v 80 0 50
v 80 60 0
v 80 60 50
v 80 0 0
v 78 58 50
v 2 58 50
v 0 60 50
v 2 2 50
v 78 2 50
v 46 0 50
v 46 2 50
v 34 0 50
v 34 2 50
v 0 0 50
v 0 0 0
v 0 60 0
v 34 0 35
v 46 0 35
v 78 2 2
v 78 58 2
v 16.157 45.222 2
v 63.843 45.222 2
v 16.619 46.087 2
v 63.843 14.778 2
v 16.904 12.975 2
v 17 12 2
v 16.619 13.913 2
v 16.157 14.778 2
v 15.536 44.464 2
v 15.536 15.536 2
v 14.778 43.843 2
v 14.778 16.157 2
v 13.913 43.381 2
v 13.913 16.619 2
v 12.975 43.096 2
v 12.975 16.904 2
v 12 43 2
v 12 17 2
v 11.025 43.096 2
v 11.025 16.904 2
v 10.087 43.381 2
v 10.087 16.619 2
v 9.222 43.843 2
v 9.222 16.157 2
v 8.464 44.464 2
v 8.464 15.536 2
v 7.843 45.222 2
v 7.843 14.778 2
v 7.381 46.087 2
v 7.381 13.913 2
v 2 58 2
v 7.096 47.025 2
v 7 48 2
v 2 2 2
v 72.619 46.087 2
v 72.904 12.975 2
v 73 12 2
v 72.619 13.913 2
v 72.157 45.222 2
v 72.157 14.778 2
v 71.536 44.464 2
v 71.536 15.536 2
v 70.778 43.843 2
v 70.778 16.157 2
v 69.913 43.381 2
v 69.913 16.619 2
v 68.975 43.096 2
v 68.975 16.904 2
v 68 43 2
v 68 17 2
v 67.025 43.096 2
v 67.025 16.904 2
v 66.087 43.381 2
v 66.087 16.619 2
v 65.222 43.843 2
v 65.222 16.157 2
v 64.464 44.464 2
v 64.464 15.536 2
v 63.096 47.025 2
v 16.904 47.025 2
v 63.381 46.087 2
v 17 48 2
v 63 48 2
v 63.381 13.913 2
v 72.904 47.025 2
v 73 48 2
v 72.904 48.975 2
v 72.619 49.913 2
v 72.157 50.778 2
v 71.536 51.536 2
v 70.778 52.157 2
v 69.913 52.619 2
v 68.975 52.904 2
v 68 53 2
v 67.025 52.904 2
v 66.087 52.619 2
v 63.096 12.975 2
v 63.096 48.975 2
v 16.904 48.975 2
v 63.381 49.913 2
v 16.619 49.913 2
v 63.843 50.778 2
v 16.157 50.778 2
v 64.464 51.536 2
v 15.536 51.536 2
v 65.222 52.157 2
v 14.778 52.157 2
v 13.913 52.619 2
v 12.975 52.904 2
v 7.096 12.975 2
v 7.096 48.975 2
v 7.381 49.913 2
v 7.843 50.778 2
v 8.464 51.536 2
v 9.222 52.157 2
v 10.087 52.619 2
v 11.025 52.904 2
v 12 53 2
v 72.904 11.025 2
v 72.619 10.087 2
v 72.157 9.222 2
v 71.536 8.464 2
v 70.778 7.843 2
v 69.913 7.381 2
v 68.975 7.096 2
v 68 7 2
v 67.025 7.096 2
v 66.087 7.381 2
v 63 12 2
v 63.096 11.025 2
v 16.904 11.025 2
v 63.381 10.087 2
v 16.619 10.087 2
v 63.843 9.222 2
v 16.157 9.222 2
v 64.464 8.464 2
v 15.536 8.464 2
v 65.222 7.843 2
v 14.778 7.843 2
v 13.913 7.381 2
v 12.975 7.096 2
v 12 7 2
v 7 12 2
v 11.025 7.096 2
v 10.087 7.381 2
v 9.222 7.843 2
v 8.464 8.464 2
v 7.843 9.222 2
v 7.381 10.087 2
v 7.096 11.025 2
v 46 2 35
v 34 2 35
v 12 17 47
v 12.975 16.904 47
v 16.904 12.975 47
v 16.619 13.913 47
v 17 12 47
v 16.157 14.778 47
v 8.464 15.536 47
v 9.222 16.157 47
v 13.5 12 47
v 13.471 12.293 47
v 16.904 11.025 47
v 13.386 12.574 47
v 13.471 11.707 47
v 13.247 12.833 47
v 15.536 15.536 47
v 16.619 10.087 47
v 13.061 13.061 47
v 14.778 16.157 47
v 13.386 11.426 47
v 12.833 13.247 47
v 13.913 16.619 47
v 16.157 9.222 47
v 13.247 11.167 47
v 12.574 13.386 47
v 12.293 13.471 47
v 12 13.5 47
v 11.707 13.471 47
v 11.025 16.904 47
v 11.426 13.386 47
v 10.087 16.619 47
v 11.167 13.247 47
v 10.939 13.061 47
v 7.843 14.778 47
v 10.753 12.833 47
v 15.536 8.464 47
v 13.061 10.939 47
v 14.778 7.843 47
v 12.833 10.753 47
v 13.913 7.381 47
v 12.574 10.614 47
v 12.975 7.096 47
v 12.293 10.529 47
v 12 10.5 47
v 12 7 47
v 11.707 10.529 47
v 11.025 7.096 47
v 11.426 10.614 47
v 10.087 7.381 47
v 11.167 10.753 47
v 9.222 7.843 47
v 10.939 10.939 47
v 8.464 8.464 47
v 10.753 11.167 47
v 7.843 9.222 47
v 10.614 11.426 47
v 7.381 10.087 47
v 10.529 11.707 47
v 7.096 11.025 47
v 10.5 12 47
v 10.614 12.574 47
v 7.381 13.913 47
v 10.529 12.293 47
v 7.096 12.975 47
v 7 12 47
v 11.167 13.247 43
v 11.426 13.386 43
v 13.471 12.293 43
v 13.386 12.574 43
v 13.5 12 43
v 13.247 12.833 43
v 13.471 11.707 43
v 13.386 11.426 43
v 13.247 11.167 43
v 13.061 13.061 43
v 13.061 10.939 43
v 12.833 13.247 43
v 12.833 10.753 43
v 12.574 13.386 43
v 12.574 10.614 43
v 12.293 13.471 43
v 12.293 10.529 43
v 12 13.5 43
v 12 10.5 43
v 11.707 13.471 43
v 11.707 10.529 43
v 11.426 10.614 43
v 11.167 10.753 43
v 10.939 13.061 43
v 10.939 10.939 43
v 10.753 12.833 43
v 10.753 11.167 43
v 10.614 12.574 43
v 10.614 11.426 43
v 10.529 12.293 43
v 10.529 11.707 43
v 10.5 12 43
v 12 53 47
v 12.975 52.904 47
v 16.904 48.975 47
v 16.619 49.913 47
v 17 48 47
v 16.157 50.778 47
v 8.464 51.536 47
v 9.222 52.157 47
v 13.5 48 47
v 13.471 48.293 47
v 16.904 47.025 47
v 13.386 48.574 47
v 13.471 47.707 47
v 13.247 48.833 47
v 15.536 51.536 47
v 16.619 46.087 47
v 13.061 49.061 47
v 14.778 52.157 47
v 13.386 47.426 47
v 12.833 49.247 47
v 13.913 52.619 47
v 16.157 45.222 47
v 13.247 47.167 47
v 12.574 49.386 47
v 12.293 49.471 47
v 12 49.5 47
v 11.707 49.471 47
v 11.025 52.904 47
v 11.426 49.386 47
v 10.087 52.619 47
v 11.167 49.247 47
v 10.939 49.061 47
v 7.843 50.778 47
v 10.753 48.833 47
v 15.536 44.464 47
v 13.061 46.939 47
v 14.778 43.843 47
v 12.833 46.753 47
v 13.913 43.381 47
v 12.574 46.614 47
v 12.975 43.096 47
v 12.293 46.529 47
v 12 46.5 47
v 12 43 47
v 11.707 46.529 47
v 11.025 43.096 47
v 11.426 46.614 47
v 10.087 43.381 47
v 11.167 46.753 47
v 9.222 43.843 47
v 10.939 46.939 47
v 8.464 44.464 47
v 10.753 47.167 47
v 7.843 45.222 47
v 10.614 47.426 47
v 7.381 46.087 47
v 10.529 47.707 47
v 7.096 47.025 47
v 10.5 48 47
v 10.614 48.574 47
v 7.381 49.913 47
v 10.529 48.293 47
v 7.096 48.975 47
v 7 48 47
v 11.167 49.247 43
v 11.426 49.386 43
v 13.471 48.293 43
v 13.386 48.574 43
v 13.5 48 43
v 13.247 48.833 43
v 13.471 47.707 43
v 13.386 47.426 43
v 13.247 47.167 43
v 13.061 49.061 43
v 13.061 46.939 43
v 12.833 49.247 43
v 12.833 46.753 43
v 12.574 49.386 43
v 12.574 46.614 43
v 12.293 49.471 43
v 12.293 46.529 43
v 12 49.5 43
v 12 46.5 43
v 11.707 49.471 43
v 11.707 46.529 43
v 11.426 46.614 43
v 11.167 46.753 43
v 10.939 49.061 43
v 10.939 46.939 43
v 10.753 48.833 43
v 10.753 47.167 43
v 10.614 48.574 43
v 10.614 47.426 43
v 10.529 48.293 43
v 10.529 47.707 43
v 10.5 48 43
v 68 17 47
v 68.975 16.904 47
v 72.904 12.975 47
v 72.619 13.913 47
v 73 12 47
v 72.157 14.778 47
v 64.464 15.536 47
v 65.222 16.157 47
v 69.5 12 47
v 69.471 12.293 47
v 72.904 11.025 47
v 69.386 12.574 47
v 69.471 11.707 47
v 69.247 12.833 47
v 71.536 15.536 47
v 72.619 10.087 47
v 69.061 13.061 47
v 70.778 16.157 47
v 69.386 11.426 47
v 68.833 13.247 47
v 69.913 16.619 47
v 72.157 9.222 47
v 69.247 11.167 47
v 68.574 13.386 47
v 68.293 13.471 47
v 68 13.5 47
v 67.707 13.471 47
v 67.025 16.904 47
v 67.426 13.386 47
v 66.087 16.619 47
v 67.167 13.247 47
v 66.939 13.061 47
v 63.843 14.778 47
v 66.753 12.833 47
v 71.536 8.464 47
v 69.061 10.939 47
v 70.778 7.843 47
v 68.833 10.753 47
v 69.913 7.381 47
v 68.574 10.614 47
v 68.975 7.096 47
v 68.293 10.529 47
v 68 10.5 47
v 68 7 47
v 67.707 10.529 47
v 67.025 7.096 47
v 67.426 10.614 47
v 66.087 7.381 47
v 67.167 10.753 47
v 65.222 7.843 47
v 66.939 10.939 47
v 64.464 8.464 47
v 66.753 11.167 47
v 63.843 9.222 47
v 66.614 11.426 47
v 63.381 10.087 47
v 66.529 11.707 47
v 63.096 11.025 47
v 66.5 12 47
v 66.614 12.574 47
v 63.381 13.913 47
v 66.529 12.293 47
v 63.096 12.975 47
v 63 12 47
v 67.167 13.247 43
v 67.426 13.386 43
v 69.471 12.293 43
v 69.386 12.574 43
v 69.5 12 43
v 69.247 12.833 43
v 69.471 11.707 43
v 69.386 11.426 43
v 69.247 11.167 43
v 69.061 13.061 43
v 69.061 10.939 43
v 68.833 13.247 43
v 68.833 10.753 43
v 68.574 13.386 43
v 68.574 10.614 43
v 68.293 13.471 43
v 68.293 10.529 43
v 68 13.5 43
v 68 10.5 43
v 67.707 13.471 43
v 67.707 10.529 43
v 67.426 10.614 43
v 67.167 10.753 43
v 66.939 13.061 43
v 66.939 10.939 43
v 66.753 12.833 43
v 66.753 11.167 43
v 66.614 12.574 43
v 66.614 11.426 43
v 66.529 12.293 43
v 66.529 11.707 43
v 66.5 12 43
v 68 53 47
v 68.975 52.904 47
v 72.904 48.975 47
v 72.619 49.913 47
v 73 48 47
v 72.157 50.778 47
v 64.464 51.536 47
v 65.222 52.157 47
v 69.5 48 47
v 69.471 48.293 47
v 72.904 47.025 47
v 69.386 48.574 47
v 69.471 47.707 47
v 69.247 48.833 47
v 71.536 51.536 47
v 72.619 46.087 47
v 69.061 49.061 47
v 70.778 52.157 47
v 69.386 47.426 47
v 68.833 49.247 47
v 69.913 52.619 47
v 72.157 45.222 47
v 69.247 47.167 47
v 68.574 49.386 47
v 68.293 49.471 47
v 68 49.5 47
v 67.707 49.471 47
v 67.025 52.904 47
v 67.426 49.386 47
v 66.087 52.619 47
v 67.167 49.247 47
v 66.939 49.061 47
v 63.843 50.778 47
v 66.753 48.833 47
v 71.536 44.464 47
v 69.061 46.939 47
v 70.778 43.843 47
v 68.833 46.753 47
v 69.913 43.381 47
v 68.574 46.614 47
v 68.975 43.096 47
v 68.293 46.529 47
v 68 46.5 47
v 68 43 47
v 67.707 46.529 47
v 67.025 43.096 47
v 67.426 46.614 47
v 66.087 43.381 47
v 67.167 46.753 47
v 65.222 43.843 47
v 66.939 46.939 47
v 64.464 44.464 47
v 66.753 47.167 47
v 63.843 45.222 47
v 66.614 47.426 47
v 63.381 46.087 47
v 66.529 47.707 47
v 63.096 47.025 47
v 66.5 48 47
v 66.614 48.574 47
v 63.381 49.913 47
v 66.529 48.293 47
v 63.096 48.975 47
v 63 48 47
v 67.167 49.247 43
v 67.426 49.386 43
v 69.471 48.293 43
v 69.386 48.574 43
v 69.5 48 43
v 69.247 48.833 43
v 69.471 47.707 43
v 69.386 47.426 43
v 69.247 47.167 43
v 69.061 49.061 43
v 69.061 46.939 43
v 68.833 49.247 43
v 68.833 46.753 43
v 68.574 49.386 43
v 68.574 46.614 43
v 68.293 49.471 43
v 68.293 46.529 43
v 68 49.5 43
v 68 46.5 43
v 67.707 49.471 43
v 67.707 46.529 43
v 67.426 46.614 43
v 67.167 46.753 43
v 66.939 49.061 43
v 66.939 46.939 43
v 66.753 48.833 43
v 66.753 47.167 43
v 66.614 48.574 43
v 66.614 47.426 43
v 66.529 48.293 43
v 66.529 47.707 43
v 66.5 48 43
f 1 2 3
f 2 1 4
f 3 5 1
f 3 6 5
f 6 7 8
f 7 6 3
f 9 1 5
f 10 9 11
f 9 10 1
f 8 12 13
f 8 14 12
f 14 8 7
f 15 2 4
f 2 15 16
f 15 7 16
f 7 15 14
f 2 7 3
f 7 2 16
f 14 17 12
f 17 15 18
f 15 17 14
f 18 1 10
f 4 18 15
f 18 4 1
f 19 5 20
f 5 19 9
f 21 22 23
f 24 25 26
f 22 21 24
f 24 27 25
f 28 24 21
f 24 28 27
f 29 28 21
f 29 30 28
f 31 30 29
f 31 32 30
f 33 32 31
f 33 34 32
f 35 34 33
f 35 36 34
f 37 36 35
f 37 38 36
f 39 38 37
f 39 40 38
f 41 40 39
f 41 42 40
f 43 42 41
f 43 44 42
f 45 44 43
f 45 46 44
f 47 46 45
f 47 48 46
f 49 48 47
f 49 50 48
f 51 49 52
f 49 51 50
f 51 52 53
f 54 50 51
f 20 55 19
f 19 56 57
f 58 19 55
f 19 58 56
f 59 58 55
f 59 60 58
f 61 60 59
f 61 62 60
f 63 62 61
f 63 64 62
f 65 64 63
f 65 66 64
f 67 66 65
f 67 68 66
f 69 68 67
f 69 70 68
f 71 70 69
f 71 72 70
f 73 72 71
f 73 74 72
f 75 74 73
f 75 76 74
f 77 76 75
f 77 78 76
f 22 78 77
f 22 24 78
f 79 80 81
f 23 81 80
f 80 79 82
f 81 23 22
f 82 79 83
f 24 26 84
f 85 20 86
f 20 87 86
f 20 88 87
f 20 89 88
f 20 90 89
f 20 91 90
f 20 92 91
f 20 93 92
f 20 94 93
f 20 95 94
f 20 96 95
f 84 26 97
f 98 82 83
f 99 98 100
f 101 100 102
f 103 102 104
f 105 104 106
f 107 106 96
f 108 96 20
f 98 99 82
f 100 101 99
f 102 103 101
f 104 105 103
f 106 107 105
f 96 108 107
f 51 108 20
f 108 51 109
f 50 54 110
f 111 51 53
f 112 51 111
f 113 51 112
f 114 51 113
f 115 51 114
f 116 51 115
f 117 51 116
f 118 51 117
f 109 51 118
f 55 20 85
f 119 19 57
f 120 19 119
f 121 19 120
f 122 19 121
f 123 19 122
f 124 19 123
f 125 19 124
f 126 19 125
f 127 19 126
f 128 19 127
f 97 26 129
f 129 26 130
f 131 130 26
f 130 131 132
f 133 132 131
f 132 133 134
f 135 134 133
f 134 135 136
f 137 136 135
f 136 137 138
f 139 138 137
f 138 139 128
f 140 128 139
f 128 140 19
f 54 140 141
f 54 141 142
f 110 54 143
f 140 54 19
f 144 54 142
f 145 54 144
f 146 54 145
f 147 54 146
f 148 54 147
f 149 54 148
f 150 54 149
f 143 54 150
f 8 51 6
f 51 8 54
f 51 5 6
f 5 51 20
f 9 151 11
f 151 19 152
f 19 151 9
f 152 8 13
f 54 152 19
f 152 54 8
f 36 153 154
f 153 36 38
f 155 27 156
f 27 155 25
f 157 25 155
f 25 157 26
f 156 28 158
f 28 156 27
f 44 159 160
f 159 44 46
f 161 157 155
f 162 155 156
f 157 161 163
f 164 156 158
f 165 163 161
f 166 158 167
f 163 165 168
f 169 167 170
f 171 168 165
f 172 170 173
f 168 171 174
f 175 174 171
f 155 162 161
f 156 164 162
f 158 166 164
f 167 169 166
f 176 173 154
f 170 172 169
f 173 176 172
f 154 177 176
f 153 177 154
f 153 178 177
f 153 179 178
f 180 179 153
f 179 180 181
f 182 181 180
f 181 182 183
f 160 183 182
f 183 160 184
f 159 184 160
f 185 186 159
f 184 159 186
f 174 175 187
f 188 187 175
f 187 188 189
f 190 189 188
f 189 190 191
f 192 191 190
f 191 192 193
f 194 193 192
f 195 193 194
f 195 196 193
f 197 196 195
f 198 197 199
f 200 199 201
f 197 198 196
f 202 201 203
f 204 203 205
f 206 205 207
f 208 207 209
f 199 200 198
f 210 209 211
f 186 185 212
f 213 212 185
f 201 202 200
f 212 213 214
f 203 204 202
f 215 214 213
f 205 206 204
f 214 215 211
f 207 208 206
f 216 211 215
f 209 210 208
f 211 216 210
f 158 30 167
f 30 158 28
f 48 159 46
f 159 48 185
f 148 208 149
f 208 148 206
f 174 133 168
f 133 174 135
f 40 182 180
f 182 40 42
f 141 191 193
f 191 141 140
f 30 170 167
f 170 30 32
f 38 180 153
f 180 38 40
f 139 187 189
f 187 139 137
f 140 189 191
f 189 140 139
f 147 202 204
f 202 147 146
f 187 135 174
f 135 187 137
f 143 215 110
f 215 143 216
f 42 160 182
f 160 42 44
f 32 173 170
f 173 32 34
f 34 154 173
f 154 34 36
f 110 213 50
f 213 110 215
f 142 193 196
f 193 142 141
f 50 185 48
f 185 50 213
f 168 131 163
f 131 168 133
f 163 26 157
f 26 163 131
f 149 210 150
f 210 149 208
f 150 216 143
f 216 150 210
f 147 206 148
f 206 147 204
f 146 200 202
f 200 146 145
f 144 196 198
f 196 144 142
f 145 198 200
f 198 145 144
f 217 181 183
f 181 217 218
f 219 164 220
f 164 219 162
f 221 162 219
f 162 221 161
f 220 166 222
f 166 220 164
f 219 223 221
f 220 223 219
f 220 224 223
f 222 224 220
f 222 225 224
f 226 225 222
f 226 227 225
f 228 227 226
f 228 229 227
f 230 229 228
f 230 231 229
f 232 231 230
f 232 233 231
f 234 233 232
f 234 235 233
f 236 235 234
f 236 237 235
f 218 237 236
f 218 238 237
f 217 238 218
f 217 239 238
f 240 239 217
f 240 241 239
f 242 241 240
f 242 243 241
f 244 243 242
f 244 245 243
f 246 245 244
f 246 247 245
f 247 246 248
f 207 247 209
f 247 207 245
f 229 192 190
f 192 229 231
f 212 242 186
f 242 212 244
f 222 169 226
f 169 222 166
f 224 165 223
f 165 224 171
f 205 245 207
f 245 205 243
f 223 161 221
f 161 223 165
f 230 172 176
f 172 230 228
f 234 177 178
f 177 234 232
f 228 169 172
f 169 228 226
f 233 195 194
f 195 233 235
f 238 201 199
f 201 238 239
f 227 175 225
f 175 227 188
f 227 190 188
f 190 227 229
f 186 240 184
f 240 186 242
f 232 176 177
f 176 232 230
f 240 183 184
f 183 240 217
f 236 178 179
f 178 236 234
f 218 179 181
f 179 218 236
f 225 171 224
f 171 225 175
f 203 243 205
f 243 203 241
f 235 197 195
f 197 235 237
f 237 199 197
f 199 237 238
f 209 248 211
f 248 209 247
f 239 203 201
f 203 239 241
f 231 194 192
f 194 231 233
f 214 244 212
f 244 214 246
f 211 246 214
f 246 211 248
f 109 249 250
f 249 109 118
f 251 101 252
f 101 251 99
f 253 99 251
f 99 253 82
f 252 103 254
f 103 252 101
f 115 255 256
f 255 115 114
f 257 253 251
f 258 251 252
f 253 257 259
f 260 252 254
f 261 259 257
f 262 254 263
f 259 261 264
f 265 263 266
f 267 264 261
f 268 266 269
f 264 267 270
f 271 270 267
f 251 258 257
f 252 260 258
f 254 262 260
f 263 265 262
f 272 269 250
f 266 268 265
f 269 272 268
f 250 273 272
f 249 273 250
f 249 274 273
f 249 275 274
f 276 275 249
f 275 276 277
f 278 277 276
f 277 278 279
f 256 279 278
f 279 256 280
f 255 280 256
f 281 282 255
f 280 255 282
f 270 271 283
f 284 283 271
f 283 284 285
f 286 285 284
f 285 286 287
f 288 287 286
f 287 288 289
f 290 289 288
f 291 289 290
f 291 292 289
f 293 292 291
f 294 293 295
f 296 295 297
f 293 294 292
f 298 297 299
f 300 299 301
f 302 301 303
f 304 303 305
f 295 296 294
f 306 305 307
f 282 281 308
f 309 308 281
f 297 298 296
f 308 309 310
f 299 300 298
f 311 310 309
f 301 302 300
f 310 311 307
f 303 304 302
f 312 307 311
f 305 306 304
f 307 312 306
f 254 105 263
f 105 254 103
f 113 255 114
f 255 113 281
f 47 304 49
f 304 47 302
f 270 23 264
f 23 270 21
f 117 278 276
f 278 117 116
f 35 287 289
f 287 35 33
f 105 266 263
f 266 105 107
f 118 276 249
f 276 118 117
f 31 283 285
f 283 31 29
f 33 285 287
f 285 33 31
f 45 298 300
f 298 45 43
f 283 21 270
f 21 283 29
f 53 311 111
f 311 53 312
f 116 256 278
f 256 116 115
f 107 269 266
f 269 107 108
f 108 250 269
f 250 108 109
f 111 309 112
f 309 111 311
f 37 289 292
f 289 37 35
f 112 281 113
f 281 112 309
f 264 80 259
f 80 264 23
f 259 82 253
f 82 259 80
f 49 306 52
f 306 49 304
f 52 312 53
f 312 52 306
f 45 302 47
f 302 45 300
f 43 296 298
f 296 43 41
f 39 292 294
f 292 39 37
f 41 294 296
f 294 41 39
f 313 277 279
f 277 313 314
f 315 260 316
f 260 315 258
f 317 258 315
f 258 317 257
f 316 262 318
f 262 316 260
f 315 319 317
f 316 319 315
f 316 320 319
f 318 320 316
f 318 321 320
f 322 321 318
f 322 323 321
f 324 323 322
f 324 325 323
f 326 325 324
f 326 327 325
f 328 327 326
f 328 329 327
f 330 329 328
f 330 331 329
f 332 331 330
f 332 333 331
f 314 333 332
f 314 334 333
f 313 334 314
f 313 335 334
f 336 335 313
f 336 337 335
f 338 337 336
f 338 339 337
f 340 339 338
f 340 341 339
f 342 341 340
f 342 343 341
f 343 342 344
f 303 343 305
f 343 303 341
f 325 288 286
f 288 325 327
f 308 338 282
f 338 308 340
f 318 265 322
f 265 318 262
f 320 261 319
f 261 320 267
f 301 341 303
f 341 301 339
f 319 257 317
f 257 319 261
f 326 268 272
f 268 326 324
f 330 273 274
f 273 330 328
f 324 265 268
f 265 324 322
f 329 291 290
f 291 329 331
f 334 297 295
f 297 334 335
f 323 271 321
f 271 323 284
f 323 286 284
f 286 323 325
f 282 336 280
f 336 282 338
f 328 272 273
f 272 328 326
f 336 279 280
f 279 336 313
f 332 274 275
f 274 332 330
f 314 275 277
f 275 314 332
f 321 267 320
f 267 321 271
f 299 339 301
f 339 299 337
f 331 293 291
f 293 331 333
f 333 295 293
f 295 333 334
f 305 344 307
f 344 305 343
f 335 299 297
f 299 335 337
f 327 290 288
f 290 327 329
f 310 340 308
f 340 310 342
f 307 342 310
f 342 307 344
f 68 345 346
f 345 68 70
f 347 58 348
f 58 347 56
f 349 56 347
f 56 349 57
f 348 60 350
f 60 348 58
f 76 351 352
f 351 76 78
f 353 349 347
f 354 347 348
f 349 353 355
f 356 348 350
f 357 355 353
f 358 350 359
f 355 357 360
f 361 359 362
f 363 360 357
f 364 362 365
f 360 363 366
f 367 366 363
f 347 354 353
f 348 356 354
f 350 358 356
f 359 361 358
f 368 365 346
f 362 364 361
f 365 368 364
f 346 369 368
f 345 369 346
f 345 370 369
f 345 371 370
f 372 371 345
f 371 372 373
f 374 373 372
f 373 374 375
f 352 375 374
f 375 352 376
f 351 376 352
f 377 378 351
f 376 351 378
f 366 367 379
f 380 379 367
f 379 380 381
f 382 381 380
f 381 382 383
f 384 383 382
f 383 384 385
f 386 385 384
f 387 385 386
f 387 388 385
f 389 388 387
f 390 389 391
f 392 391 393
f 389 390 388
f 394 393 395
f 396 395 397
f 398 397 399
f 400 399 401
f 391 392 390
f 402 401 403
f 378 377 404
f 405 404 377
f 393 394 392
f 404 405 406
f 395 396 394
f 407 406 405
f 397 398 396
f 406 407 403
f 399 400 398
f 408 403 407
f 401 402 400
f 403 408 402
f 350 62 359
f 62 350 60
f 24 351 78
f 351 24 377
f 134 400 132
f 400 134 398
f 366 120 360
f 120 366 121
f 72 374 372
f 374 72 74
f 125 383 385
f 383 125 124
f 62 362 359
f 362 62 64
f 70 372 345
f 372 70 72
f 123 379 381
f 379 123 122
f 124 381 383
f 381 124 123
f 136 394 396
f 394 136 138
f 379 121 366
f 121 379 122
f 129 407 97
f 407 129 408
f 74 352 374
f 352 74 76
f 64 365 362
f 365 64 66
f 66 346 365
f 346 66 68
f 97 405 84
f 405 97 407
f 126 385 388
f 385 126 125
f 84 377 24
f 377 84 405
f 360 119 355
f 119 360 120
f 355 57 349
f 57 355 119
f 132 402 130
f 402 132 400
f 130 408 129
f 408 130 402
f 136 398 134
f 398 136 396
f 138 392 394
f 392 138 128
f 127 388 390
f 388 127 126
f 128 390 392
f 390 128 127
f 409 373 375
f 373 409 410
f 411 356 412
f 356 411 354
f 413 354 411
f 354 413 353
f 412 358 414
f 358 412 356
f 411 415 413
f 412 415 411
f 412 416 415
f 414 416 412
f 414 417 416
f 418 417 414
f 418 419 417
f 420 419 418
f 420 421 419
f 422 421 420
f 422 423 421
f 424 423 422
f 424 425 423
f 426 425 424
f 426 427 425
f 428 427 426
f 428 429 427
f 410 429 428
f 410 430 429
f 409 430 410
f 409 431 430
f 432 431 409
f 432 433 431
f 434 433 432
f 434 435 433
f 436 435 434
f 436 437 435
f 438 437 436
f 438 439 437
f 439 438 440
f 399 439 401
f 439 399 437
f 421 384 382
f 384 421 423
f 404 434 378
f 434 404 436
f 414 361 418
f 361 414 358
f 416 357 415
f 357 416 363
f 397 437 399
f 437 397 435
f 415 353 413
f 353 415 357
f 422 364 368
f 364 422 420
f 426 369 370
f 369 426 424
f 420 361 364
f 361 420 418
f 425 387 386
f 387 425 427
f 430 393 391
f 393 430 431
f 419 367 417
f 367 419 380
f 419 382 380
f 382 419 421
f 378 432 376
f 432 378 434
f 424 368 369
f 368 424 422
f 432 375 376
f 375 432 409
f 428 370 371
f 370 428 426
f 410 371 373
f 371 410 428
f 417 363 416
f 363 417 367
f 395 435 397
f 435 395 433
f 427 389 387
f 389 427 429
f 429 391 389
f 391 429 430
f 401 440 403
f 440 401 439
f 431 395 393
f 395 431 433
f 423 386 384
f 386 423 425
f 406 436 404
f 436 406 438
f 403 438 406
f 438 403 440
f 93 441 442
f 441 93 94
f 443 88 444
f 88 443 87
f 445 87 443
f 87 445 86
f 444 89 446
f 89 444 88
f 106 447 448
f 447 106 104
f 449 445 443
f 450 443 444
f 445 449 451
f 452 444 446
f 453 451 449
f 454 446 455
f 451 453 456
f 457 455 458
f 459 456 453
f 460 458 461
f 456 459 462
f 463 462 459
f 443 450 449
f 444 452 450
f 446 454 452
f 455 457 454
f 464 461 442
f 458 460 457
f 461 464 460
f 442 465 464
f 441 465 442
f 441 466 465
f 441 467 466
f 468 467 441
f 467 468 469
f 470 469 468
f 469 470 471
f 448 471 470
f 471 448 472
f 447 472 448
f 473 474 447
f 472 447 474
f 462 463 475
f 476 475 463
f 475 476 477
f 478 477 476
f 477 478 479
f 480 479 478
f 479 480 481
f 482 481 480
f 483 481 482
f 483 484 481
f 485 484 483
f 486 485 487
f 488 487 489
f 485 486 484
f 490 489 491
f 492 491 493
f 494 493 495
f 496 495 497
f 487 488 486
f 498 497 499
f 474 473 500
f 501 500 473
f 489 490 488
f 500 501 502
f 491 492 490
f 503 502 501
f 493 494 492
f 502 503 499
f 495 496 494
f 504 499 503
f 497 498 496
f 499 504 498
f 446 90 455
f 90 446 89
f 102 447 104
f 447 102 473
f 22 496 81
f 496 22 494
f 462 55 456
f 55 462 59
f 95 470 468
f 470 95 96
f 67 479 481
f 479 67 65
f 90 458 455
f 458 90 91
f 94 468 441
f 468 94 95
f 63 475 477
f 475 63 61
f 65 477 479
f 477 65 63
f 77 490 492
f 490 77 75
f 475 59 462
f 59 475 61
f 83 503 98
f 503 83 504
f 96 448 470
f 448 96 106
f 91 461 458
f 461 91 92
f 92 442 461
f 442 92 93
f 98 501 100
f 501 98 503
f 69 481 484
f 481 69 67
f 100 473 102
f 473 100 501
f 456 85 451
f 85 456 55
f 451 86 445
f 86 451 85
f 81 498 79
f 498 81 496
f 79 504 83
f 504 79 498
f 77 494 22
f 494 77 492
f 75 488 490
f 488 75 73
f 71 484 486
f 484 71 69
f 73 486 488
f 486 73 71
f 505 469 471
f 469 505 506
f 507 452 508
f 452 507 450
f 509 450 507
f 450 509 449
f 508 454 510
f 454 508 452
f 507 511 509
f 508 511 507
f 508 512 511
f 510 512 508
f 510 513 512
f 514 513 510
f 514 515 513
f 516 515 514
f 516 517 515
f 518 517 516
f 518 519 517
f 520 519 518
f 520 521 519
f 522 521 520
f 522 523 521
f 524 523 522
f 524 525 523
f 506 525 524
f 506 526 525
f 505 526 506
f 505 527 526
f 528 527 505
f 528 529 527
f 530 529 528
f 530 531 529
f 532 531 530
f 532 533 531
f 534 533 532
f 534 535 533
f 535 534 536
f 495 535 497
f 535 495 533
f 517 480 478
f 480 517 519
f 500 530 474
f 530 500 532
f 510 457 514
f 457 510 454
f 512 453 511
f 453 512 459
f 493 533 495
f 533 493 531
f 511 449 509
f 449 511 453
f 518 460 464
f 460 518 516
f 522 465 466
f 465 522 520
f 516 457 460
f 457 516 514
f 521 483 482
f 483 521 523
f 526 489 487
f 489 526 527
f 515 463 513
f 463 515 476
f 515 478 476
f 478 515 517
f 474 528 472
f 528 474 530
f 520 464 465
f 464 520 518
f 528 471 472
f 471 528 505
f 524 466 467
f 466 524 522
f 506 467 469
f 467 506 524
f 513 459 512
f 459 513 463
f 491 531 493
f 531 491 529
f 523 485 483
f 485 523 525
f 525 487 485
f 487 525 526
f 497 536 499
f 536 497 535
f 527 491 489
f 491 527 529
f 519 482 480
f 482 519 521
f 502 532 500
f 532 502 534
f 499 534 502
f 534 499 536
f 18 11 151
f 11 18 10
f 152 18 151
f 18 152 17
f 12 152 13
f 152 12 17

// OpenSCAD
$fn = 32;

// ----------------------------------------------------------------------
// Enclosure box: both enclosure
// ----------------------------------------------------------------------

// --- parameters (mm) ---
box_l = 80;               // outer length, X
box_w = 60;               // outer width, Y
box_h = 50;               // outer height
wall_t = 2;               // wall thickness
boss_r = 5;               // corner boss radius
hole_r = 1.5;             // boss screw hole radius
boss_in = 12;             // boss inset from the corners
notch_w = 12;             // cable notch width
notch_h = 15;             // cable notch height

inner_h = box_h - wall_t;  // cavity depth
boss_h = inner_h - 2;  // corner boss height

difference() {
  union() {
    difference() {
      cube([box_l, box_w, box_h]);
      translate([wall_t, wall_t, wall_t])
        cube([box_l - 2 * wall_t, box_w - 2 * wall_t, box_h]);
    }
    for (sx = [0, 1], sy = [0, 1])
      translate([sx ? box_l - boss_in : boss_in,
                 sy ? box_w - boss_in : boss_in, wall_t - 1])
        difference() {
          cylinder(r = boss_r, h = boss_h);
          translate([0, 0, boss_h - 4])
            cylinder(r = hole_r, h = 5);
        }
  }
  translate([box_l / 2 - notch_w / 2, -1, box_h - notch_h])
    cube([notch_w, wall_t + 2, notch_h + 1]);
}
